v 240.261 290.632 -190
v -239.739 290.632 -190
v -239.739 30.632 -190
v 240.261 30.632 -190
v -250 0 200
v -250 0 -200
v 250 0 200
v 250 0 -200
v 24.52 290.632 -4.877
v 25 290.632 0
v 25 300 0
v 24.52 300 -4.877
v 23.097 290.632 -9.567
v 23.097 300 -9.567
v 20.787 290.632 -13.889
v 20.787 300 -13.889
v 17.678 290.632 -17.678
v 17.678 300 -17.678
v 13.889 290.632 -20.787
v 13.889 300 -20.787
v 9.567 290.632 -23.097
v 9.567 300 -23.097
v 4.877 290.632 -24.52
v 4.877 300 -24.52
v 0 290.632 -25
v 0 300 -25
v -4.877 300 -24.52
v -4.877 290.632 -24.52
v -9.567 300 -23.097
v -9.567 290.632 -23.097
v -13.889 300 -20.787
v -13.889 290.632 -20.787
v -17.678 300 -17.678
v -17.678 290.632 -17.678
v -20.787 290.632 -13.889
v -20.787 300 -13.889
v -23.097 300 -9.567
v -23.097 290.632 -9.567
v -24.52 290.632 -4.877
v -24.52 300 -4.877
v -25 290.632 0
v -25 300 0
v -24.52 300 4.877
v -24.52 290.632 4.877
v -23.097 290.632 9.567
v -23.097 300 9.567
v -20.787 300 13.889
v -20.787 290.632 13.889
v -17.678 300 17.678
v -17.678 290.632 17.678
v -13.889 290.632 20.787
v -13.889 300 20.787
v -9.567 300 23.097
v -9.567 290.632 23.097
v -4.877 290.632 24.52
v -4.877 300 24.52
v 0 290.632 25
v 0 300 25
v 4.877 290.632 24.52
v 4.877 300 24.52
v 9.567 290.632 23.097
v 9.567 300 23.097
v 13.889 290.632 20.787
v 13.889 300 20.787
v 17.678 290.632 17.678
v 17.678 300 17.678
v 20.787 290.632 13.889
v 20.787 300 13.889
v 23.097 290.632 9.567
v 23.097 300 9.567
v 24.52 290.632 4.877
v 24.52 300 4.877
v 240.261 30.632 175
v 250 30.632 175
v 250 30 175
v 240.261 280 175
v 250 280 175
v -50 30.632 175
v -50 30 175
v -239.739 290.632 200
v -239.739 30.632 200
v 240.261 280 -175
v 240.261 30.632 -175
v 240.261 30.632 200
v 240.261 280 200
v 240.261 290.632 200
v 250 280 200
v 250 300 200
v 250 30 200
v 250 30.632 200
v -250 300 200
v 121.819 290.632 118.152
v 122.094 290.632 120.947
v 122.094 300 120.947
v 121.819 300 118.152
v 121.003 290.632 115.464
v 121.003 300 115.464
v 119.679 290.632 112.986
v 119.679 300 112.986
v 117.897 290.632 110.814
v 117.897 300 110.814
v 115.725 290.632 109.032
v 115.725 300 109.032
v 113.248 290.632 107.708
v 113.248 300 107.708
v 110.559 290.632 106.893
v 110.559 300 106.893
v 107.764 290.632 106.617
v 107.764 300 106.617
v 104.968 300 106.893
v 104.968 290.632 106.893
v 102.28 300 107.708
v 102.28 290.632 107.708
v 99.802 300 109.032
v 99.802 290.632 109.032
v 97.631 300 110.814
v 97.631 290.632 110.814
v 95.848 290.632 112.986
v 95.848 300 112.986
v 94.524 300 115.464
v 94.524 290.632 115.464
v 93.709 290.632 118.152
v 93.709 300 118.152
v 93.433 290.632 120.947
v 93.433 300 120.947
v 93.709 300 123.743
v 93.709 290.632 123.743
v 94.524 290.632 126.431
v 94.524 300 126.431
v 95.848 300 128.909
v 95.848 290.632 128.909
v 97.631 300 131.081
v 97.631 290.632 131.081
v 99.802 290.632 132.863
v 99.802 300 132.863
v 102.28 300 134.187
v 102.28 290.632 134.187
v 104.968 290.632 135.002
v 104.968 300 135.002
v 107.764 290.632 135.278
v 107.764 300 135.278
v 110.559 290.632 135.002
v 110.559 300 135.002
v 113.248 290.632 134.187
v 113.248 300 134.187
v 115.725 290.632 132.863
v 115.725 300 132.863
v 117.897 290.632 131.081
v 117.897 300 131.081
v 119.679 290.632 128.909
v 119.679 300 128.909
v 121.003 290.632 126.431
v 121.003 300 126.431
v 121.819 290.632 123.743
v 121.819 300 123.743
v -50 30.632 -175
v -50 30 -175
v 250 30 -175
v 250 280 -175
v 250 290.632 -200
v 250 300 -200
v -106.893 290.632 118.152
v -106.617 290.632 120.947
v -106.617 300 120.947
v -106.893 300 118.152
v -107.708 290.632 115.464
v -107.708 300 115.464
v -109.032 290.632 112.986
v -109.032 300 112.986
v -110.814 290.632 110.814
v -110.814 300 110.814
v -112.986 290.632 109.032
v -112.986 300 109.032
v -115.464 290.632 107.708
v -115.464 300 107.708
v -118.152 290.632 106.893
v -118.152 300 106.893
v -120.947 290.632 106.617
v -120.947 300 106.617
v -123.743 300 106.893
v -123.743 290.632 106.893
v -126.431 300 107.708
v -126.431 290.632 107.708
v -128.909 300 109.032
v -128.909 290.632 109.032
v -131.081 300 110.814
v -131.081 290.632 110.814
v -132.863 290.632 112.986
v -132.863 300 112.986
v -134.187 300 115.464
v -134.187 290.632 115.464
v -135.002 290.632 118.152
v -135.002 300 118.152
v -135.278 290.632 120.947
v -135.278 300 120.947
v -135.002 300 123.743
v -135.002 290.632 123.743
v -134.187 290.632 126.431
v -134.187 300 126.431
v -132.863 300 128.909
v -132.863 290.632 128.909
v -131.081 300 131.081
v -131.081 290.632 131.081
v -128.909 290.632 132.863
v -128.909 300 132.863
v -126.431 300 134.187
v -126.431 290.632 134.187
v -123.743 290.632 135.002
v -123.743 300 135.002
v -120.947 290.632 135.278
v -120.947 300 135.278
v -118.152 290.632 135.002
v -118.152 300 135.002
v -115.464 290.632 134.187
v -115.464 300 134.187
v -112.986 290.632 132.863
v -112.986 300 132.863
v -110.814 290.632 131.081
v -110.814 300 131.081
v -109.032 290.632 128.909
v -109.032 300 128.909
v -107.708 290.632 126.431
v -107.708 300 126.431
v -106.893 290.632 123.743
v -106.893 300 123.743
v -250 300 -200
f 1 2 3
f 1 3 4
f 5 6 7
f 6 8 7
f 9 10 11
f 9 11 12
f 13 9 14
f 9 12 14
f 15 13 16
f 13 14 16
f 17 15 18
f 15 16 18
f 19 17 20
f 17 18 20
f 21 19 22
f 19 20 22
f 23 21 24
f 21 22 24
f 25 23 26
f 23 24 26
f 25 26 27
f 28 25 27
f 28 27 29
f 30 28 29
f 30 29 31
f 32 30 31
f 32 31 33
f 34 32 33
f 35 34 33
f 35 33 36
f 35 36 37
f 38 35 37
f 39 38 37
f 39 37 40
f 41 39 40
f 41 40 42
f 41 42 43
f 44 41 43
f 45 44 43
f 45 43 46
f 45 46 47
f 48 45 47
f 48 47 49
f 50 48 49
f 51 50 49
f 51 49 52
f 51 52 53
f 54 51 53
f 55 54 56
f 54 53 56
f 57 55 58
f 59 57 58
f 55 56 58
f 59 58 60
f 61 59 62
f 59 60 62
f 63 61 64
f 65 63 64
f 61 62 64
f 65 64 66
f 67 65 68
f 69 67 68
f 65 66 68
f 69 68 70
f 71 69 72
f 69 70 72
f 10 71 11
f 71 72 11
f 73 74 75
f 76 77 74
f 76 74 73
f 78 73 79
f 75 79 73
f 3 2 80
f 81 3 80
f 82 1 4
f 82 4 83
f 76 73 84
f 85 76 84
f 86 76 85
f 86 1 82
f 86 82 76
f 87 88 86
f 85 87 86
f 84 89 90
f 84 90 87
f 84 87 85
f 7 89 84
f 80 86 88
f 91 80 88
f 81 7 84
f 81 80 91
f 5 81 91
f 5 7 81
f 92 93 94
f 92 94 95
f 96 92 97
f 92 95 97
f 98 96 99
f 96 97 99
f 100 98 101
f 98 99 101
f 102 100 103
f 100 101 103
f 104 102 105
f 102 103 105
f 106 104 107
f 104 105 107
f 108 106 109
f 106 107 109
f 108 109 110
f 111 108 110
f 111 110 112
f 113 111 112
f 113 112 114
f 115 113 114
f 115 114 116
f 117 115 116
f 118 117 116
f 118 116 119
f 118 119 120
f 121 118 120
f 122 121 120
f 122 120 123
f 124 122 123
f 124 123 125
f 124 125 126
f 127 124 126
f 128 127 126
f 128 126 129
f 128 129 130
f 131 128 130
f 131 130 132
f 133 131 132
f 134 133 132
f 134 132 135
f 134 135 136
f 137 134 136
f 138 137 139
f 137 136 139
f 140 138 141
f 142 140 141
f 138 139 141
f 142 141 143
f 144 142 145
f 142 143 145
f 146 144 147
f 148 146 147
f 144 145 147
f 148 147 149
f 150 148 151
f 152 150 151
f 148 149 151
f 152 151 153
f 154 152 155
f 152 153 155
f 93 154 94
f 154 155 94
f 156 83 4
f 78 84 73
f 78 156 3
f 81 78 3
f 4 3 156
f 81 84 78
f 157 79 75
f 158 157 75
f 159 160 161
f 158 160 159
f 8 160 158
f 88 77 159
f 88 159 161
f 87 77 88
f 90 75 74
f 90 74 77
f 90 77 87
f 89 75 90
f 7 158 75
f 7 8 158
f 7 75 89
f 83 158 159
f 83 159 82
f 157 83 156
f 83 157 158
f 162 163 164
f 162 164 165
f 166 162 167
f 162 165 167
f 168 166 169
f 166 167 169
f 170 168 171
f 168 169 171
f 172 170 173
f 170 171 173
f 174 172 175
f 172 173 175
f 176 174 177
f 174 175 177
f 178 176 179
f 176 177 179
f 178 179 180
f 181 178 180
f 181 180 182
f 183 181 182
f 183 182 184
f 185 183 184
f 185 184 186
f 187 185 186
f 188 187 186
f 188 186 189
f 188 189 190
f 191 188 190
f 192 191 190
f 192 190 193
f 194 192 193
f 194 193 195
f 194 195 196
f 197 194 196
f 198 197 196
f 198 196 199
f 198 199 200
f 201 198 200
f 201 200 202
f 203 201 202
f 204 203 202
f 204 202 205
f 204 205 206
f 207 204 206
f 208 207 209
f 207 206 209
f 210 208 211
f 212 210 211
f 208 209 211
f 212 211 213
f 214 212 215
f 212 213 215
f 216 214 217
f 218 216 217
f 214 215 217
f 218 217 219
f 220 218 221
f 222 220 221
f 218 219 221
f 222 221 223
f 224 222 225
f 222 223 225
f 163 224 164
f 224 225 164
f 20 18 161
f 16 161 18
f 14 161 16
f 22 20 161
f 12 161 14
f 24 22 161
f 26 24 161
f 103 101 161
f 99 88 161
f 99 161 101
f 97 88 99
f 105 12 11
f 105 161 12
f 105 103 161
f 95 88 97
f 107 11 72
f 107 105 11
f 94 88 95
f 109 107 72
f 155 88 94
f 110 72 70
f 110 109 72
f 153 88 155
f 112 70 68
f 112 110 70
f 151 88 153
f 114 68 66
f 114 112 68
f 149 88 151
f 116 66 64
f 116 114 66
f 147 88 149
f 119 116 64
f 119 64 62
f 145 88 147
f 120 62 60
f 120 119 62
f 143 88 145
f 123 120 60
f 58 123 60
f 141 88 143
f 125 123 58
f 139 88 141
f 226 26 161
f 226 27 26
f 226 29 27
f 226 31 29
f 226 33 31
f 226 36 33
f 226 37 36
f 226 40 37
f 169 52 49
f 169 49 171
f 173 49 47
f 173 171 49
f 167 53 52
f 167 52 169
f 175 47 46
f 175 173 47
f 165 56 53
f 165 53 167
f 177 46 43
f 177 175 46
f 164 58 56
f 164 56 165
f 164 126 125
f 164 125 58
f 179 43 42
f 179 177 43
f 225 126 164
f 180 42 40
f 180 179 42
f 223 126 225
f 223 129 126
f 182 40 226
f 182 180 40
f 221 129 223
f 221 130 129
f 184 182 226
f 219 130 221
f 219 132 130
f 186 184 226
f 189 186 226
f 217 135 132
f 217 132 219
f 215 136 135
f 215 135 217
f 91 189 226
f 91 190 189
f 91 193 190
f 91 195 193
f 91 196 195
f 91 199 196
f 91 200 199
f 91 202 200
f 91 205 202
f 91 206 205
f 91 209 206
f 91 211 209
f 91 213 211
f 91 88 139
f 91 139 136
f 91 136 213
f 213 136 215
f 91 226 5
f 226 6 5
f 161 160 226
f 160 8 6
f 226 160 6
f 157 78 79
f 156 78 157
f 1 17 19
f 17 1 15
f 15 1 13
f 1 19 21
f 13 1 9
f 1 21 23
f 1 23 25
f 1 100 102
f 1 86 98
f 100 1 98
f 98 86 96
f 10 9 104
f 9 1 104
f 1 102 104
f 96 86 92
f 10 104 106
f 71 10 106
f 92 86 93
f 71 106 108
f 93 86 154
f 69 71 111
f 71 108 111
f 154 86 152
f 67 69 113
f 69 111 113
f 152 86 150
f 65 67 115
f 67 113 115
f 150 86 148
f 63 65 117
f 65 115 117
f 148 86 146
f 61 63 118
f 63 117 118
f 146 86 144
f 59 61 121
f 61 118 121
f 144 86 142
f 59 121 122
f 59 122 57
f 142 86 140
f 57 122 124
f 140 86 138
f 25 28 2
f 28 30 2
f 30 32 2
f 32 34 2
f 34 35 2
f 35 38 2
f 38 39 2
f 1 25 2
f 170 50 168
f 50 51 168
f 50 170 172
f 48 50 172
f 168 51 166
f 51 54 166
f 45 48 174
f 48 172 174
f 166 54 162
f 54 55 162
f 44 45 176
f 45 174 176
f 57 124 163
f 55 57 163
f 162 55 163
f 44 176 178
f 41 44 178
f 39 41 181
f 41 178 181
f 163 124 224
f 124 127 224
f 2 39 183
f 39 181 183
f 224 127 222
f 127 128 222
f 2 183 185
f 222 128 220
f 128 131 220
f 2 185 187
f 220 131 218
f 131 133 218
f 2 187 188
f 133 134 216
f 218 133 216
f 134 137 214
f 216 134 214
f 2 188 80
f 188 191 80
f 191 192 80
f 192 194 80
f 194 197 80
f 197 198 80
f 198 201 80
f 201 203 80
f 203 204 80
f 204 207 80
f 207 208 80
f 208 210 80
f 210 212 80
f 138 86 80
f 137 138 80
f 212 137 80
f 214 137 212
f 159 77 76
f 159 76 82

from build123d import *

# Parameters (mm, degrees)
SKETCH1_W                 = 375
SKETCH1_H                 = 10.632083078
BOSS_EXTRUDE1_DEPTH       = 9.738944775
SKETCH2_W                 = 9.738944775
SKETCH2_H                 = 25
BOSS_EXTRUDE2_DEPTH       = 249.367916922
BOSS_EXTRUDE3_DEPTH       = 0.632083078
SKETCH4_W                 = 489.738944775
SKETCH4_H                 = 375
BOSS_EXTRUDE4_DEPTH       = 30
SKETCH5_W                 = 489.738944775
SKETCH5_H                 = 290.632083078
BOSS_EXTRUDE5_DEPTH       = 25
SKETCH6_W                 = 400
SKETCH6_H                 = 290.632083078
BOSS_EXTRUDE6_DEPTH       = 10.261055225
SKETCH7_W                 = 500
SKETCH7_H                 = 400
BOSS_EXTRUDE7_DEPTH       = 9.367916922
SKETCH8_W                 = 480
SKETCH8_H                 = 260
CUT_EXTRUDE1_DEPTH        = 15
M25_CLEARANCE_HOLE1_D     = 28.660544953
M25_CLEARANCE_HOLE1_DEPTH = 9.367916922
M45_CLEARANCE_HOLE1_D     = 50
M45_CLEARANCE_HOLE1_DEPTH = 9.367916922


with BuildPart() as part:
    # Sketch1 → Boss-Extrude1 (new body)
    with BuildSketch(Plane(origin=(250, 0, 0), x_dir=(0, 0, -1), z_dir=(1, 0, 0))):
        with Locations((-12.5, 285.316041539)):
            Rectangle(SKETCH1_W, SKETCH1_H)
    extrude(amount=-BOSS_EXTRUDE1_DEPTH)

    # Sketch2 → Boss-Extrude2 (add)
    with BuildSketch(Plane.XZ.offset(-280)):
        with Locations((245.130527613, 187.5)):
            Rectangle(SKETCH2_W, SKETCH2_H)
    extrude(amount=BOSS_EXTRUDE2_DEPTH)

    # Sketch3 → Boss-Extrude3 (add)
    with BuildSketch(Plane.XZ.offset(-30.632083078)):
        Polygon((-50, 175), (-50, -175), (-239.738944775, -175), (-239.738944775, 200), (250, 200), (250, 175), align=None)
    extrude(amount=BOSS_EXTRUDE3_DEPTH)

    # Sketch4 → Boss-Extrude4 (add)
    with BuildSketch(Plane.XZ.offset(-30)):
        with Locations((5.130527613, 12.5)):
            Rectangle(SKETCH4_W, SKETCH4_H)
    extrude(amount=BOSS_EXTRUDE4_DEPTH)

    # Sketch5 → Boss-Extrude5 (add)
    with BuildSketch(Plane(origin=(0, 0, -175), x_dir=(-1, 0, 0), z_dir=(0, 0, -1))):
        with Locations((-5.130527613, 145.316041539)):
            Rectangle(SKETCH5_W, SKETCH5_H)
    extrude(amount=BOSS_EXTRUDE5_DEPTH)

    # Sketch6 → Boss-Extrude6 (add)
    with BuildSketch(Plane.ZY.offset(239.738944775)):
        with Locations((0, 145.316041539)):
            Rectangle(SKETCH6_W, SKETCH6_H)
    extrude(amount=BOSS_EXTRUDE6_DEPTH)

    # Sketch7 → Boss-Extrude7 (add)
    with BuildSketch(Plane(origin=(0, 290.632083078, 0), x_dir=(-1, 0, 0), z_dir=(0, 1, 0))):
        Rectangle(SKETCH7_W, SKETCH7_H)
    extrude(amount=BOSS_EXTRUDE7_DEPTH)

    # Sketch8 → Cut-Extrude1 (cut)
    with BuildSketch(Plane.XY.offset(-175)):
        with Locations((0.261055225, 160.632083078)):
            Rectangle(SKETCH8_W, SKETCH8_H)
    extrude(amount=-CUT_EXTRUDE1_DEPTH, mode=Mode.SUBTRACT)

    # M25 Clearance Hole1
    with Locations(Plane(origin=(0, 290.632083078, 0), x_dir=(-1, 0, 0), z_dir=(0, -1, 0))):
        with Locations((-107.763649025, -120.947499703), (120.947499703, -120.947499703)):
            Hole(M25_CLEARANCE_HOLE1_D / 2, depth=M25_CLEARANCE_HOLE1_DEPTH)

    # M45 Clearance Hole1
    with Locations(Plane(origin=(0, 290.632083078, 0), x_dir=(-1, 0, 0), z_dir=(0, -1, 0))):
        with Locations((0, 0)):
            Hole(M45_CLEARANCE_HOLE1_D / 2, depth=M45_CLEARANCE_HOLE1_DEPTH)


solid = part.part
